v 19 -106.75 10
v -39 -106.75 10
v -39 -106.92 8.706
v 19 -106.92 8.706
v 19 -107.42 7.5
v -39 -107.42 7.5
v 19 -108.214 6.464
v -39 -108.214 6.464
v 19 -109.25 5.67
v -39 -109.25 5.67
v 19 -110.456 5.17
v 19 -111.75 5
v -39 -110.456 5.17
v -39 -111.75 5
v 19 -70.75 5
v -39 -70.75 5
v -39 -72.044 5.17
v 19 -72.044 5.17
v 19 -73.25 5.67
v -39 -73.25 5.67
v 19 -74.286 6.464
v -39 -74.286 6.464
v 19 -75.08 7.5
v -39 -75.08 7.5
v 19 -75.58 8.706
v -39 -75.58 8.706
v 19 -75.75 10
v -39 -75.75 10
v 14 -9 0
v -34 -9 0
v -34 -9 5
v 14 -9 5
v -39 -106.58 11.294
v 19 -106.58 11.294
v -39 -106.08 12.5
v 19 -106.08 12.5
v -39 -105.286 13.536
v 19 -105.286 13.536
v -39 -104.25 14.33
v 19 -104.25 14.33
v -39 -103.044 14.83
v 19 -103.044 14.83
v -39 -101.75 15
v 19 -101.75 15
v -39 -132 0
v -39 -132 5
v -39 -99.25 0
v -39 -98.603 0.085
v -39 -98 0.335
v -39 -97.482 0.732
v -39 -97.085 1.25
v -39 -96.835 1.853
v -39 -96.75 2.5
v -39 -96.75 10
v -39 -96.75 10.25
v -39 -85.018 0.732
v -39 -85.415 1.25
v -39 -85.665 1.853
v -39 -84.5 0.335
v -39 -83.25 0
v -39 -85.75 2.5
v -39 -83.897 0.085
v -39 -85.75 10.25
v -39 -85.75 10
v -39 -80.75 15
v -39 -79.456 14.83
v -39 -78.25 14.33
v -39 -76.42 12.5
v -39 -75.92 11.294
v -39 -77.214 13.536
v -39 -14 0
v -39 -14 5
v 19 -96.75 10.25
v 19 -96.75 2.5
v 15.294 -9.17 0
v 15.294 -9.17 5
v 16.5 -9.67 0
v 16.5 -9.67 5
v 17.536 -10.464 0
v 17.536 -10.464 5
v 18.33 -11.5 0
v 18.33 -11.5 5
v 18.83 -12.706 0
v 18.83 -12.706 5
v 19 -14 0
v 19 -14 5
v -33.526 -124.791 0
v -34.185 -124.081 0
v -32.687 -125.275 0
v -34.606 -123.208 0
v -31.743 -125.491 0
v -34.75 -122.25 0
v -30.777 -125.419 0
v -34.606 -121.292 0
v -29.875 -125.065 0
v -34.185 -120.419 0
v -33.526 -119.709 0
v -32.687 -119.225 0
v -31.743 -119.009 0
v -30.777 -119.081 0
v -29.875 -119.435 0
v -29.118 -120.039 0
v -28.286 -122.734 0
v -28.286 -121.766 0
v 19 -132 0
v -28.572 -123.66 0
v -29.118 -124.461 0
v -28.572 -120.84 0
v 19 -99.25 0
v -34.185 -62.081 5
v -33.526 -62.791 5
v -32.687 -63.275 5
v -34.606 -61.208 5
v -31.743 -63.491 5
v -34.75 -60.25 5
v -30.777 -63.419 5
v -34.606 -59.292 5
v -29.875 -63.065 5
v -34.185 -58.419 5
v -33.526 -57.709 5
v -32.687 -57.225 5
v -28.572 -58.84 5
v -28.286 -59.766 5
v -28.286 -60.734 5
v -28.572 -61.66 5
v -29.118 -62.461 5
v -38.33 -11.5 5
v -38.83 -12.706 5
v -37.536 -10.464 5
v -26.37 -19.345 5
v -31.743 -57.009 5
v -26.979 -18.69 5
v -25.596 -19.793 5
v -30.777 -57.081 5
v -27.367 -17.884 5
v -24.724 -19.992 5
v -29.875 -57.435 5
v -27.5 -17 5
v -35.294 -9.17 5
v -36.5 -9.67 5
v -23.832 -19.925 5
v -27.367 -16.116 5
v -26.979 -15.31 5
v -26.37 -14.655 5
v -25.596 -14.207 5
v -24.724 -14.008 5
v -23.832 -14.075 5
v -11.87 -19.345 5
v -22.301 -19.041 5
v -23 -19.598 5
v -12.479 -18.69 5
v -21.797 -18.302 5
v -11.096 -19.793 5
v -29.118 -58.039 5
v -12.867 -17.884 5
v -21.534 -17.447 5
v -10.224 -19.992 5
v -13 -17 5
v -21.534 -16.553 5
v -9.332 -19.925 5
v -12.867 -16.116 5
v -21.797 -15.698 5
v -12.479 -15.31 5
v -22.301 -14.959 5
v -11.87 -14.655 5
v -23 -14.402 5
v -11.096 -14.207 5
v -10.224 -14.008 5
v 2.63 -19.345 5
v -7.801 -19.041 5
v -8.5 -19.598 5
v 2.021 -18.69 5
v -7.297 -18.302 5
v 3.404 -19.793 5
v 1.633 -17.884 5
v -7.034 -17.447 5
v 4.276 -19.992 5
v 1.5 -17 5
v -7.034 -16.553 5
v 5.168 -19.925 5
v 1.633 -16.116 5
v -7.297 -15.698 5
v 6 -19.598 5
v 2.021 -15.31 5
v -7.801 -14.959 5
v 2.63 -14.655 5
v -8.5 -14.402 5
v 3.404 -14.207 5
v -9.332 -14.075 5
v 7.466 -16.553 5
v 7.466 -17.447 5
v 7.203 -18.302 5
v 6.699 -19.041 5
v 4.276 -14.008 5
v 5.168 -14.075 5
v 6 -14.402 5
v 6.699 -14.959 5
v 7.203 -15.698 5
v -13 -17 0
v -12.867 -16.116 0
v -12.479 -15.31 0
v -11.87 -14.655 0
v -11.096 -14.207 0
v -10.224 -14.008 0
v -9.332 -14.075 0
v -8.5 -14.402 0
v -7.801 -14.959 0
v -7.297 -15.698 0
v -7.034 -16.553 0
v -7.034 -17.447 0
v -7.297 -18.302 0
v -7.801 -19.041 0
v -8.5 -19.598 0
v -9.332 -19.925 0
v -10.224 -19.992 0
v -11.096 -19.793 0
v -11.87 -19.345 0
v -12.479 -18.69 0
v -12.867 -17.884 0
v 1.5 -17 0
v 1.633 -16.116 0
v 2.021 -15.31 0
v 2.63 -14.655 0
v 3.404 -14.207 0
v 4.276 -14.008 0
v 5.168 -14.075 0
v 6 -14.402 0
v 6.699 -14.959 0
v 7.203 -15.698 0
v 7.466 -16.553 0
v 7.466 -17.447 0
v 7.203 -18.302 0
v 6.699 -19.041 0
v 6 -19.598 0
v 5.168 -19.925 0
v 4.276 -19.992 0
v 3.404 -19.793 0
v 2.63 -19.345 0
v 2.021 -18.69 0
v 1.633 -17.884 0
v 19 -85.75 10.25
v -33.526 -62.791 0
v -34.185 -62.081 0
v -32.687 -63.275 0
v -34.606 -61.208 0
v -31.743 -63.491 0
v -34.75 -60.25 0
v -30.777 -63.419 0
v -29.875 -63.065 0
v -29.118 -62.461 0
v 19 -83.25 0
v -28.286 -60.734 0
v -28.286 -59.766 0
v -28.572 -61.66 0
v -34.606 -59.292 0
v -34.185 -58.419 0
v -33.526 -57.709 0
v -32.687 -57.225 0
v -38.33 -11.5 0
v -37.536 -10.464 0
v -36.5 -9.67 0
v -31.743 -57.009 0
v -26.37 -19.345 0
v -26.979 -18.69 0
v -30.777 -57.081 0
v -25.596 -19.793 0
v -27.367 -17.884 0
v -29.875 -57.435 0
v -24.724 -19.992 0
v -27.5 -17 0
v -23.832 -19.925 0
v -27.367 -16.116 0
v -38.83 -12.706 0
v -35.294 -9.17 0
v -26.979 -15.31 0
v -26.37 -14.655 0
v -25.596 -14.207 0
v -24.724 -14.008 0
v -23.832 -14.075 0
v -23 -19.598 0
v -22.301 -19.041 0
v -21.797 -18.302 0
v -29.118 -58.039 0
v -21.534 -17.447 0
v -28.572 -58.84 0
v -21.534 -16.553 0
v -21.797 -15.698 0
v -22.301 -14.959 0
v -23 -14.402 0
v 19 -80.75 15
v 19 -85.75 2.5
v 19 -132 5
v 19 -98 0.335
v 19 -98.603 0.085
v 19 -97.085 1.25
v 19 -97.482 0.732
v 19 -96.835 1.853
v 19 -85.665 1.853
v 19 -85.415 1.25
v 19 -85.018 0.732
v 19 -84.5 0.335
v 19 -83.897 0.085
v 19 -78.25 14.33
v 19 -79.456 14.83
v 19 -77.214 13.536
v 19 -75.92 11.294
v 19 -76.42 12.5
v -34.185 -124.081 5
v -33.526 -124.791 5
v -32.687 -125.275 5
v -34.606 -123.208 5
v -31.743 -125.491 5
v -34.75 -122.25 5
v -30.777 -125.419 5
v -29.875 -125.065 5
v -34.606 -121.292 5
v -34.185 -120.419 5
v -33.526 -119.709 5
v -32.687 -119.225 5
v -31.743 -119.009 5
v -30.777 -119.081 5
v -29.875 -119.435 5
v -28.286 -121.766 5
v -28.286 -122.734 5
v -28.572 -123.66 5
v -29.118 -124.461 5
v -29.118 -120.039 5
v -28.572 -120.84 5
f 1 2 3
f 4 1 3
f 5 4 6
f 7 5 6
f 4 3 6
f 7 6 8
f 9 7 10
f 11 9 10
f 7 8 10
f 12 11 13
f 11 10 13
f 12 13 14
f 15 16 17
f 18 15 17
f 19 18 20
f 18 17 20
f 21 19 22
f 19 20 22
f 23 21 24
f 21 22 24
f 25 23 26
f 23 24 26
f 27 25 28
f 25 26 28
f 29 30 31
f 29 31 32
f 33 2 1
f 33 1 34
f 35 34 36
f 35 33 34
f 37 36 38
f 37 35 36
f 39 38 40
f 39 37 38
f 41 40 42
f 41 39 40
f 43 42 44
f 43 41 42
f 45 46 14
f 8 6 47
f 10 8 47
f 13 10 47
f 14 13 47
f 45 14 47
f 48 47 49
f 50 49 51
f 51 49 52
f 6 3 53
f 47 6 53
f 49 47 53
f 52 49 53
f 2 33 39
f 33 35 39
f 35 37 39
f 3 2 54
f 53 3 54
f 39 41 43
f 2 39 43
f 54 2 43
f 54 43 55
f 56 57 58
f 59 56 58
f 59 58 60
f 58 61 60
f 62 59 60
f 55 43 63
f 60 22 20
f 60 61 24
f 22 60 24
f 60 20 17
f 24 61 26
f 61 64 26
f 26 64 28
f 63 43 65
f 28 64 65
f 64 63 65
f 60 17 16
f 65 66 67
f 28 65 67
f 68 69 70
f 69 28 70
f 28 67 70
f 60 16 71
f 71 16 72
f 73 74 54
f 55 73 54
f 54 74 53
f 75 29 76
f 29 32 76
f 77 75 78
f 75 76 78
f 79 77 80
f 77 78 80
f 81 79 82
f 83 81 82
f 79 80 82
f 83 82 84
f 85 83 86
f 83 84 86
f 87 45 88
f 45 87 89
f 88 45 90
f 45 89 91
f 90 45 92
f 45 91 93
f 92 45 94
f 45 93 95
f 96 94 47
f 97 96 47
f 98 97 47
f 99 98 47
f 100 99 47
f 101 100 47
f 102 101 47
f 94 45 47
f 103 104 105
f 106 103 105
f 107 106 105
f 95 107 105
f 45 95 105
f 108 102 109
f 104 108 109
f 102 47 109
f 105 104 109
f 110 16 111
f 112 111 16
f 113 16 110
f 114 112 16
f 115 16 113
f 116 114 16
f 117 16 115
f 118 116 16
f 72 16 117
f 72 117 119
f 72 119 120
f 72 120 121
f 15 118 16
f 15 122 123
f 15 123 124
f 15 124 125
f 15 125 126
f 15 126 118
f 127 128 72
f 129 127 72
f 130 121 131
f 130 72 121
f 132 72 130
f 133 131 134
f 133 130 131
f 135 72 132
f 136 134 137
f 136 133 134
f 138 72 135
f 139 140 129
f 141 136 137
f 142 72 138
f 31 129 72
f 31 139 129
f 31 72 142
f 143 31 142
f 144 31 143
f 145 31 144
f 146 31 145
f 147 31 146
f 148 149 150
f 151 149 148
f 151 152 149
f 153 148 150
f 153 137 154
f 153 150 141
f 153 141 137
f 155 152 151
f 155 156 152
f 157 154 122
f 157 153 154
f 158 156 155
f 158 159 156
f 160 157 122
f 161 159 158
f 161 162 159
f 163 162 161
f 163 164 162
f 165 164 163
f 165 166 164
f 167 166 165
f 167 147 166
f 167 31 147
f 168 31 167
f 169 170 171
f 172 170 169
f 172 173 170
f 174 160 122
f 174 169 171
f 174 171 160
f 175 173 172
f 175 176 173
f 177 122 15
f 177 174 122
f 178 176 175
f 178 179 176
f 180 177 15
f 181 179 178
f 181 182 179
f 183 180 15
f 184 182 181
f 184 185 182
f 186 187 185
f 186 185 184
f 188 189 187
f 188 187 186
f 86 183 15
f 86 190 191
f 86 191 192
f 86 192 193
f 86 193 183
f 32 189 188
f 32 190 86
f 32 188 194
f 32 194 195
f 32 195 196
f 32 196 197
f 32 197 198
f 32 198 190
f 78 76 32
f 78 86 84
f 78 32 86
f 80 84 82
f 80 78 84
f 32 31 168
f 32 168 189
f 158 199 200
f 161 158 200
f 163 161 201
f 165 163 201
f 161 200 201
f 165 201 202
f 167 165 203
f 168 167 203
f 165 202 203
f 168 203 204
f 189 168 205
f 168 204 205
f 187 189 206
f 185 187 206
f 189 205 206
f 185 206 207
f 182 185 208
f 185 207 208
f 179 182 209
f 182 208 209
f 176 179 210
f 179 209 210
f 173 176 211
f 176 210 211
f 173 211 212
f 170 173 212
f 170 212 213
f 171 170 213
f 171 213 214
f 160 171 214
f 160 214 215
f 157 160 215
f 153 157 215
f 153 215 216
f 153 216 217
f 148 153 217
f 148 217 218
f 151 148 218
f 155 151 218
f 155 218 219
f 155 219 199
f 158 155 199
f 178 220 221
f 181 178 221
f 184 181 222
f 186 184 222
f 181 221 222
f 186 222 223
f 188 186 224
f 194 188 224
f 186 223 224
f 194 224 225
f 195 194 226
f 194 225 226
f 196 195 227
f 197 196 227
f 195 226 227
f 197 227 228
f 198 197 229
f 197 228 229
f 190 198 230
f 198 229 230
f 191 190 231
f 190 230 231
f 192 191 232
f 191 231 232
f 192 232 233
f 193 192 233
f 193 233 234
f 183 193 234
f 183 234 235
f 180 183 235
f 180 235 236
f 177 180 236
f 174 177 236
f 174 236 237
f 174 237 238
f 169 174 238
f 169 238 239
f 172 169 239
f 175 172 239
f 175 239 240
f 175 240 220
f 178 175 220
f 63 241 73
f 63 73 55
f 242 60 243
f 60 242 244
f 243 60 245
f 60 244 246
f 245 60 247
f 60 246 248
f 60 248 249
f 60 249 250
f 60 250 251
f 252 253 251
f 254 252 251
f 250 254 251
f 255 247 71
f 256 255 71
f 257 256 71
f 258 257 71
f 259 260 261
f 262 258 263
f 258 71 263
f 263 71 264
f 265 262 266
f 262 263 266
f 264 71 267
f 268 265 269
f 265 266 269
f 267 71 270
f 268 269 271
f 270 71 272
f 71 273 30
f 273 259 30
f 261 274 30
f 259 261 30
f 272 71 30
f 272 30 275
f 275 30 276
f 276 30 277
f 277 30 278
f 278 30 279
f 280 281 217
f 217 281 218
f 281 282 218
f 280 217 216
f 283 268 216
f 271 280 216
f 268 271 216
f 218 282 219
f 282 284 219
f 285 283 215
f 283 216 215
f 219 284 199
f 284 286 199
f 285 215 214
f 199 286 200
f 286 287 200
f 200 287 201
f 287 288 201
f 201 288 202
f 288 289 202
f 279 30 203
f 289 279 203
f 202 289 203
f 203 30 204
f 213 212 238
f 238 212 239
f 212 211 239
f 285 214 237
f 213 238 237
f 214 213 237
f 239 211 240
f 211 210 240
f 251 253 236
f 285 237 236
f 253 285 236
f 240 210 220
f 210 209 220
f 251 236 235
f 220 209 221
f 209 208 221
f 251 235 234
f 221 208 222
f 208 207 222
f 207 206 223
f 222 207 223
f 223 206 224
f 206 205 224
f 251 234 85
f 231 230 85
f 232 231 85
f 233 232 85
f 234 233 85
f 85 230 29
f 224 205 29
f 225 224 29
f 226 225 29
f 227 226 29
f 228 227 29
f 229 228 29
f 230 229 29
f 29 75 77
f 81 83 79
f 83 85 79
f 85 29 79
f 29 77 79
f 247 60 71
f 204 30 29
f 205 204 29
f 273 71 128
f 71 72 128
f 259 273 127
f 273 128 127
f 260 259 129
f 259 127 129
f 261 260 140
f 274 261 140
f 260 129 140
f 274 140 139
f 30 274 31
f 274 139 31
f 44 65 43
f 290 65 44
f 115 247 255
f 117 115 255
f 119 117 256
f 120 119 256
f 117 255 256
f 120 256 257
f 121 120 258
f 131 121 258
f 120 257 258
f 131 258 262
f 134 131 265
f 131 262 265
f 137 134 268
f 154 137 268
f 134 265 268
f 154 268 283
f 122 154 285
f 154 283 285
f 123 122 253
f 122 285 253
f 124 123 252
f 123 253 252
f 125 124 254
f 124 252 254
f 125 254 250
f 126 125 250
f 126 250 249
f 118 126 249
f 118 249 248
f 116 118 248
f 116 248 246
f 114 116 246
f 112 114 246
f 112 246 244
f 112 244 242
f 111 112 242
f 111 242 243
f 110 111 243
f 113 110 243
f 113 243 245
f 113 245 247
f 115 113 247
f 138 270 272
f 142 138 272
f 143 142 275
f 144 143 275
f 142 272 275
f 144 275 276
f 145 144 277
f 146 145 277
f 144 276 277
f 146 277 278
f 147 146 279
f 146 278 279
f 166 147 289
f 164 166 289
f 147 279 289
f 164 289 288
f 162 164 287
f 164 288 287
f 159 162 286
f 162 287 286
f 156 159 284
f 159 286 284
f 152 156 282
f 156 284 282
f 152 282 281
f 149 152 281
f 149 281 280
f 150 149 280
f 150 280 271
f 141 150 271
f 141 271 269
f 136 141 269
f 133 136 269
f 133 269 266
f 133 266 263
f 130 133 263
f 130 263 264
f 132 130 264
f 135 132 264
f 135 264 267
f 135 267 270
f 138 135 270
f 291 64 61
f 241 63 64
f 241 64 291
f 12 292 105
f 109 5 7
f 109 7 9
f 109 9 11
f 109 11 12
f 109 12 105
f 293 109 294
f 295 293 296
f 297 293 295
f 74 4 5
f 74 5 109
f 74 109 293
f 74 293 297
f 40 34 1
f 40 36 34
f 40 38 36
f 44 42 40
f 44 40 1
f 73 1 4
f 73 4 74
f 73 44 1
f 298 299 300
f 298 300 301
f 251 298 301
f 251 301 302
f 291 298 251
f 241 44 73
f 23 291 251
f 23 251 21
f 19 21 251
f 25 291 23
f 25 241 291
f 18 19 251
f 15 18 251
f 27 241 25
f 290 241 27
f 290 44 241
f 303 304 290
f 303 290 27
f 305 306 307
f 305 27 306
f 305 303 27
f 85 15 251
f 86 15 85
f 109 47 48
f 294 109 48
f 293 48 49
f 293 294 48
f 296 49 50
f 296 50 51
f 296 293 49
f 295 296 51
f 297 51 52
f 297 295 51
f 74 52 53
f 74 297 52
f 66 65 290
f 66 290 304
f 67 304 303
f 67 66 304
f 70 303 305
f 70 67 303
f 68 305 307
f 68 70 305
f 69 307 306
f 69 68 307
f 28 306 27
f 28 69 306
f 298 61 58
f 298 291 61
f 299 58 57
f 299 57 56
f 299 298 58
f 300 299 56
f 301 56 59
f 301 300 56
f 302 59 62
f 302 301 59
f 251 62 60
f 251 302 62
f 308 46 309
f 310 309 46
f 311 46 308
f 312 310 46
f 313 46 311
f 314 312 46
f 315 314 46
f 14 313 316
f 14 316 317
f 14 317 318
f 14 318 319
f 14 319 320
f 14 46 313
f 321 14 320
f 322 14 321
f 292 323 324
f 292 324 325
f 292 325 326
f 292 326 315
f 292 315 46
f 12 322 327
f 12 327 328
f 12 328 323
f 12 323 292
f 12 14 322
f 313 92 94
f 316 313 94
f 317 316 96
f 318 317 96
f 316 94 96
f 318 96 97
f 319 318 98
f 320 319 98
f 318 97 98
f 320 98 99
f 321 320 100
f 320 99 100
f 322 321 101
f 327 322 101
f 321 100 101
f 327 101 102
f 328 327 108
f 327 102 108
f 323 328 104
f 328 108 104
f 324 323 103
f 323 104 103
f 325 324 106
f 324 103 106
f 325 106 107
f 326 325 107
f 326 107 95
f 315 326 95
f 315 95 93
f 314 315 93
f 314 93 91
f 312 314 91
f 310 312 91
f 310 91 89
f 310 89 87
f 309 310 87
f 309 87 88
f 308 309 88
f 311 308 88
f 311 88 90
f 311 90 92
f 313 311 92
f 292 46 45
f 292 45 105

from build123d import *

# Parameters (mm, degrees)
SKETCH1_W           = 58
SKETCH1_H           = 20
BOSS_EXTRUDE1_DEPTH = 10
SKETCH2_W           = 58
SKETCH2_H           = 10
BOSS_EXTRUDE3_DEPTH = 103
SKETCH4_W           = 58
SKETCH4_H           = 11
CUT_EXTRUDE2_DEPTH  = 103
SKETCH5_W           = 58
SKETCH5_H           = 31
BOSS_EXTRUDE4_DEPTH = 5
SKETCH6_W           = 58
SKETCH6_H           = 66.819677738
SKETCH6_W_2         = 58.198762754
SKETCH6_H_2         = 25.25
CUT_EXTRUDE3_DEPTH  = 5
FILLET2_START       = -39
FILLET2_DEPTH       = 58
FILLET2_2_DEPTH     = 58
FILLET3_R           = 2.5
SKETCH7_W           = 58.063983185
SKETCH7_H           = 11
CUT_EXTRUDE4_DEPTH  = 0.25
SKETCH9_R           = 3
SKETCH9_R_2         = 3.25
CUT_EXTRUDE5_DEPTH  = 139.455769111
FILLET4_R           = 5


with BuildPart() as part:
    # Sketch1 → Boss-Extrude1 (new body)
    with BuildSketch(Plane.XY):
        with Locations((-10, -19)):
            Rectangle(SKETCH1_W, SKETCH1_H)
    extrude(amount=BOSS_EXTRUDE1_DEPTH)

    # Sketch2 → Boss-Extrude3 (add)
    with BuildSketch(Plane.XZ.offset(29)):
        with Locations((-10, 5)):
            Rectangle(SKETCH2_W, SKETCH2_H)
    extrude(amount=BOSS_EXTRUDE3_DEPTH)

    # Sketch4 → Cut-Extrude2 (cut)
    with BuildSketch(Plane.XY.offset(10)):
        with Locations((-10, -91.25)):
            Rectangle(SKETCH4_W, SKETCH4_H)
    extrude(amount=-CUT_EXTRUDE2_DEPTH, mode=Mode.SUBTRACT)


with BuildPart() as cut_extrude2_piece_1:
    # of the separate pieces the step leaves, piece 1, a body of its own (cut_extrude2_pieces)
    add(part.part.solids().sort_by_distance((-39, -9, 0))[0])



with BuildPart() as cut_extrude2_piece_2:
    # of the separate pieces the step leaves, piece 2, a body of its own (cut_extrude2_pieces)
    add(part.part.solids().sort_by_distance((-39, -96.75, 10))[0])


with BuildPart() as cut_extrude2_piece_1_1:
    add(cut_extrude2_piece_1.part)

    add(cut_extrude2_piece_2.part)  # Boss-Extrude4 merges Cut-Extrude2 piece 2
    # Sketch5 → Boss-Extrude4 (add)
    with BuildSketch(Plane.XY.offset(10)):
        with Locations((-10, -91.25)):
            Rectangle(SKETCH5_W, SKETCH5_H)
    extrude(amount=BOSS_EXTRUDE4_DEPTH)

    # Sketch6 → Cut-Extrude3 (cut)
    with BuildSketch(Plane.XY.offset(10)):
        with Locations((-10, -42.340161131)):
            Rectangle(SKETCH6_W, SKETCH6_H)
        with Locations((-9.900618623, -119.375)):
            Rectangle(SKETCH6_W_2, SKETCH6_H_2)
    extrude(amount=-CUT_EXTRUDE3_DEPTH, mode=Mode.SUBTRACT)

    # Fillet2: read off the stored shape, not the designer's step
    # Fillet2 outline → Fillet2 (cut)
    with BuildSketch(Plane.YZ.offset(FILLET2_START)):
        with BuildLine():
            ThreePointArc((-106.75, 10), (-105.285533906, 13.535533906), (-101.75, 15))
            Line((-101.75, 15), (-106.75, 15))
            Line((-106.75, 15), (-106.75, 10))
        make_face()
        with BuildLine():
            ThreePointArc((-80.75, 15), (-77.214466094, 13.535533906), (-75.75, 10))
            Line((-75.75, 10), (-75.75, 15))
            Line((-75.75, 15), (-80.75, 15))
        make_face()
    extrude(amount=FILLET2_DEPTH, mode=Mode.SUBTRACT)

    # Fillet2 2 outline → Fillet2 2 (add)
    with BuildSketch(Plane.YZ.offset(FILLET2_START)):
        with BuildLine():
            Line((-75.75, 5), (-70.75, 5))
            ThreePointArc((-70.75, 5), (-74.285533906, 6.464466094), (-75.75, 10))
            Line((-75.75, 10), (-75.75, 5))
        make_face()
        with BuildLine():
            Line((-106.75, 5), (-106.75, 10))
            ThreePointArc((-106.75, 10), (-108.214466094, 6.464466094), (-111.75, 5))
            Line((-111.75, 5), (-106.75, 5))
        make_face()
    extrude(amount=FILLET2_2_DEPTH)

    # Fillet3
    fillet3_edges = [cut_extrude2_piece_1_1.edges().sort_by_distance(p)[0] for p in [
        (-10, -85.75, 0),
        (-10, -96.75, 0),
    ]]
    fillet(fillet3_edges, radius=FILLET3_R)

    # Sketch7 → Cut-Extrude4 (cut)
    with BuildSketch(Plane(origin=(0, 0, 10), x_dir=(-1, 0, 0), z_dir=(0, 0, -1))):
        with Locations((9.968008407, -91.25)):
            Rectangle(SKETCH7_W, SKETCH7_H)
    extrude(amount=-CUT_EXTRUDE4_DEPTH, mode=Mode.SUBTRACT)

    # Sketch9 → Cut-Extrude5 (cut, through all)
    with BuildSketch(Plane(origin=(0, 0, 0), x_dir=(-1, 0, 0), z_dir=(0, 0, -1))):
        with Locations((24.5, -17)):
            Circle(SKETCH9_R)
        with Locations((10, -17)):
            Circle(SKETCH9_R)
        with Locations((-4.5, -17)):
            Circle(SKETCH9_R)
        with Locations((31.5, -60.25)):
            Circle(SKETCH9_R_2)
        with Locations((31.5, -122.25)):
            Circle(SKETCH9_R_2)
    extrude(amount=-CUT_EXTRUDE5_DEPTH, mode=Mode.SUBTRACT)

    # Fillet4
    fillet4_edges = [cut_extrude2_piece_1_1.edges().sort_by_distance(p)[0] for p in [
        (-39, -9, 2.5),
        (19, -9, 2.5),
    ]]
    fillet(fillet4_edges, radius=FILLET4_R)


solid = cut_extrude2_piece_1_1.part
